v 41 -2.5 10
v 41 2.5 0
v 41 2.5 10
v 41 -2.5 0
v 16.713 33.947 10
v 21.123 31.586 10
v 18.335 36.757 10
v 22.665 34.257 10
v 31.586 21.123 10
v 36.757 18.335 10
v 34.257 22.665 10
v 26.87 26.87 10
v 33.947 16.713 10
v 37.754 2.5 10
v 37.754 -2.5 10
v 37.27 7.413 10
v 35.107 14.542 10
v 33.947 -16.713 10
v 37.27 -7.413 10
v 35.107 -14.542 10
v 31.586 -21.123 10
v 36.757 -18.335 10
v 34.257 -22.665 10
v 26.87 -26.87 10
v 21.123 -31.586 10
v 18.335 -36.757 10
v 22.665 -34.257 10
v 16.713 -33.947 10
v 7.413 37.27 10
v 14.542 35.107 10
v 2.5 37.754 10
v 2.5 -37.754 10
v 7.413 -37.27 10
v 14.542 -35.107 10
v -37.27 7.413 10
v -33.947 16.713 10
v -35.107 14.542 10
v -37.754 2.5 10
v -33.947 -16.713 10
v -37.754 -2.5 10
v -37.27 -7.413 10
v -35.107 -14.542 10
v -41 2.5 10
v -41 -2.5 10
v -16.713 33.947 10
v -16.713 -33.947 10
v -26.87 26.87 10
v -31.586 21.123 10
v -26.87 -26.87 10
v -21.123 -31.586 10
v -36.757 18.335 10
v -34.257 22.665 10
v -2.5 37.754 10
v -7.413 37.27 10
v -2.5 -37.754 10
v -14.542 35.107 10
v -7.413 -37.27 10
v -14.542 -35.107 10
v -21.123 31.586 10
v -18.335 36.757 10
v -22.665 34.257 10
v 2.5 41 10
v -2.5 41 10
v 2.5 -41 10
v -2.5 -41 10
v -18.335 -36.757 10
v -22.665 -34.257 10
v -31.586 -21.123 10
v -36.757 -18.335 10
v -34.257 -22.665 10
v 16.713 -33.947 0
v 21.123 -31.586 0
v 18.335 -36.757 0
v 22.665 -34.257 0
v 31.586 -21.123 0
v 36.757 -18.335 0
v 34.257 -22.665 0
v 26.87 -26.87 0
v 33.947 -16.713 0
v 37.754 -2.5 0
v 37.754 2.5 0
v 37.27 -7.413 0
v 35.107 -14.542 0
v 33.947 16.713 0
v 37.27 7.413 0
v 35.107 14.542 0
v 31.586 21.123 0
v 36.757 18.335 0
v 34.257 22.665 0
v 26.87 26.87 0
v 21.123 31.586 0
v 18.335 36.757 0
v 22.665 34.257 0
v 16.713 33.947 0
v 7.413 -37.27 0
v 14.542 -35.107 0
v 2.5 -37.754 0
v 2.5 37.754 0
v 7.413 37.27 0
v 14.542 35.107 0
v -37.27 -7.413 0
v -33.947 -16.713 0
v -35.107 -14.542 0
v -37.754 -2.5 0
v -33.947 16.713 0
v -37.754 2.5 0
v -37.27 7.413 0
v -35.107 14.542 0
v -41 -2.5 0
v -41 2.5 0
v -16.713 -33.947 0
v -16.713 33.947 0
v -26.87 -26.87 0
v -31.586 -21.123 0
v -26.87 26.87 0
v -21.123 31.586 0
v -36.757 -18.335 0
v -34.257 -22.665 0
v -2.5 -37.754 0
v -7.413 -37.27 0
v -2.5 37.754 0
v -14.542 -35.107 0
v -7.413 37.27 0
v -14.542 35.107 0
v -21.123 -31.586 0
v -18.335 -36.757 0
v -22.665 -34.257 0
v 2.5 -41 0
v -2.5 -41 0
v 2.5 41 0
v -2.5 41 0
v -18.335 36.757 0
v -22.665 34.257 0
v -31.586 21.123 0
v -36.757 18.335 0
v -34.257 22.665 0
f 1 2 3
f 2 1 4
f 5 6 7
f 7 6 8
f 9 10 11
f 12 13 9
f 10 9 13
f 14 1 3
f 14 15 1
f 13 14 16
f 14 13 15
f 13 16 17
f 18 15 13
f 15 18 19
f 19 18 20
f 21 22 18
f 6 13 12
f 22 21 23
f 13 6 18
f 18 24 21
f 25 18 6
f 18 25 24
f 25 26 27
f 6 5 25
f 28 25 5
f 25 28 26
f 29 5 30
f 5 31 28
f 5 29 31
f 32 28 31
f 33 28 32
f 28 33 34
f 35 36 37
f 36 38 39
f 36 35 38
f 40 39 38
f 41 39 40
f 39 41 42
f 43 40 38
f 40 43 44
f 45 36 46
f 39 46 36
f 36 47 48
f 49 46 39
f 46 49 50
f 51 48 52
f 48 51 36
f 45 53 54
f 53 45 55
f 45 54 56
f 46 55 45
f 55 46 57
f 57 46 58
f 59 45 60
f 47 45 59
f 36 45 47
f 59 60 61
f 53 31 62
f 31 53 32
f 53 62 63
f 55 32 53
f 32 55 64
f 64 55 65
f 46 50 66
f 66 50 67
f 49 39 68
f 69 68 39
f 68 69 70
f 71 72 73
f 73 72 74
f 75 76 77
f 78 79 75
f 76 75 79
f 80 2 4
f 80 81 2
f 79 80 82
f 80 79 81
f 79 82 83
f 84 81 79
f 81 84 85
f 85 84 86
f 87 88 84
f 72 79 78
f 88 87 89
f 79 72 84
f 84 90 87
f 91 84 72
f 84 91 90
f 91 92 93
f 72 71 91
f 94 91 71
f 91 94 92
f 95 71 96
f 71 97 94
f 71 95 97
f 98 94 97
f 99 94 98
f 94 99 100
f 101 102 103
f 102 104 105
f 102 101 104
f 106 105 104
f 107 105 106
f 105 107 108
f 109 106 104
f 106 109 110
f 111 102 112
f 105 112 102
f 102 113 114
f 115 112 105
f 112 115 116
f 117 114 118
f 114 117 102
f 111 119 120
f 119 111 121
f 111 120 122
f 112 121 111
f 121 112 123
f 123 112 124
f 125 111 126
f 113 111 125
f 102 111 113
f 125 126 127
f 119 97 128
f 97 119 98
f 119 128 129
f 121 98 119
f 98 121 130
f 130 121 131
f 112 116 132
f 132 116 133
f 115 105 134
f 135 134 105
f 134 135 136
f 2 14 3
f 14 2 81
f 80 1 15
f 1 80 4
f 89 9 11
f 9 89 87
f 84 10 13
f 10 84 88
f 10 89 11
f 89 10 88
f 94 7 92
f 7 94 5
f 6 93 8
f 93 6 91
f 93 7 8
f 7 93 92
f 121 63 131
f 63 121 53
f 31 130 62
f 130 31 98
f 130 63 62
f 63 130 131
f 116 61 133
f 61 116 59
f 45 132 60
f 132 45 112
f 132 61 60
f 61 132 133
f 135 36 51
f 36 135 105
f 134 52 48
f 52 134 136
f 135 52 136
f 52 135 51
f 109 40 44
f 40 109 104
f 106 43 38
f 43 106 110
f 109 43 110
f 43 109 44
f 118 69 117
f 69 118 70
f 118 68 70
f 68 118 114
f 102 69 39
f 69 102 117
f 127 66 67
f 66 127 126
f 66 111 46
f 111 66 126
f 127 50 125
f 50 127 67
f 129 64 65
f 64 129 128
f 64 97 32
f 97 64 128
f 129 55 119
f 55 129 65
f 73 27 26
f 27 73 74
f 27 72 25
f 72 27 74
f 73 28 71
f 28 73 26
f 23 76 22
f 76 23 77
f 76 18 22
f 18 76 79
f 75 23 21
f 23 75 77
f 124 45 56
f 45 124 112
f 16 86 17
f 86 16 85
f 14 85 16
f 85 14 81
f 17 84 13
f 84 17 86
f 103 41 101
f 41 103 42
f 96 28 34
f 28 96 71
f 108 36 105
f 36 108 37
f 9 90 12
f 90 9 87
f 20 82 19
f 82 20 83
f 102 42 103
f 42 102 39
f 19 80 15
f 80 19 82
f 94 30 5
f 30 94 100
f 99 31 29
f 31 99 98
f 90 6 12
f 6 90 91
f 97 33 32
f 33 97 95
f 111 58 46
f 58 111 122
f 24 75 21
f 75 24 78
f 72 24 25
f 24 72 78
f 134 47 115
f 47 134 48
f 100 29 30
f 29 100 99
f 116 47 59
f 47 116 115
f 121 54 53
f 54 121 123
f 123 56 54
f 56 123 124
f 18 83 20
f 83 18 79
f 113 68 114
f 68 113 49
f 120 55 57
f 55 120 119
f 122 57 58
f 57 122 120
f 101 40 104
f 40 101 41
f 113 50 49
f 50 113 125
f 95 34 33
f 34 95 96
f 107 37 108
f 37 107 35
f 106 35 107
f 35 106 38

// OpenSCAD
$fn = 32;

// ----------------------------------------------------------------------
// Spur blank: plain gear blank
// ----------------------------------------------------------------------

// --- parameters (mm) ---
disc_r = 38;              // blank root radius
disc_t = 10;              // blank thickness
n_teeth = 12;             // stub tooth count
tooth_w = 5;              // tooth width at the root
tooth_h = 3;              // tooth height above the root

out_r = disc_r + tooth_h;  // tip radius
bbox_x = 82.0;  // measured width over the teeth
bbox_y = 82.0;  // measured depth over the teeth

union() {
  cylinder(r = disc_r, h = disc_t);
  for (i = [0 : n_teeth - 1])
    rotate([0, 0, i * 360 / n_teeth])
      translate([disc_r - 1, -tooth_w / 2, 0])
        cube([tooth_h + 1, tooth_w, disc_t]);
}
